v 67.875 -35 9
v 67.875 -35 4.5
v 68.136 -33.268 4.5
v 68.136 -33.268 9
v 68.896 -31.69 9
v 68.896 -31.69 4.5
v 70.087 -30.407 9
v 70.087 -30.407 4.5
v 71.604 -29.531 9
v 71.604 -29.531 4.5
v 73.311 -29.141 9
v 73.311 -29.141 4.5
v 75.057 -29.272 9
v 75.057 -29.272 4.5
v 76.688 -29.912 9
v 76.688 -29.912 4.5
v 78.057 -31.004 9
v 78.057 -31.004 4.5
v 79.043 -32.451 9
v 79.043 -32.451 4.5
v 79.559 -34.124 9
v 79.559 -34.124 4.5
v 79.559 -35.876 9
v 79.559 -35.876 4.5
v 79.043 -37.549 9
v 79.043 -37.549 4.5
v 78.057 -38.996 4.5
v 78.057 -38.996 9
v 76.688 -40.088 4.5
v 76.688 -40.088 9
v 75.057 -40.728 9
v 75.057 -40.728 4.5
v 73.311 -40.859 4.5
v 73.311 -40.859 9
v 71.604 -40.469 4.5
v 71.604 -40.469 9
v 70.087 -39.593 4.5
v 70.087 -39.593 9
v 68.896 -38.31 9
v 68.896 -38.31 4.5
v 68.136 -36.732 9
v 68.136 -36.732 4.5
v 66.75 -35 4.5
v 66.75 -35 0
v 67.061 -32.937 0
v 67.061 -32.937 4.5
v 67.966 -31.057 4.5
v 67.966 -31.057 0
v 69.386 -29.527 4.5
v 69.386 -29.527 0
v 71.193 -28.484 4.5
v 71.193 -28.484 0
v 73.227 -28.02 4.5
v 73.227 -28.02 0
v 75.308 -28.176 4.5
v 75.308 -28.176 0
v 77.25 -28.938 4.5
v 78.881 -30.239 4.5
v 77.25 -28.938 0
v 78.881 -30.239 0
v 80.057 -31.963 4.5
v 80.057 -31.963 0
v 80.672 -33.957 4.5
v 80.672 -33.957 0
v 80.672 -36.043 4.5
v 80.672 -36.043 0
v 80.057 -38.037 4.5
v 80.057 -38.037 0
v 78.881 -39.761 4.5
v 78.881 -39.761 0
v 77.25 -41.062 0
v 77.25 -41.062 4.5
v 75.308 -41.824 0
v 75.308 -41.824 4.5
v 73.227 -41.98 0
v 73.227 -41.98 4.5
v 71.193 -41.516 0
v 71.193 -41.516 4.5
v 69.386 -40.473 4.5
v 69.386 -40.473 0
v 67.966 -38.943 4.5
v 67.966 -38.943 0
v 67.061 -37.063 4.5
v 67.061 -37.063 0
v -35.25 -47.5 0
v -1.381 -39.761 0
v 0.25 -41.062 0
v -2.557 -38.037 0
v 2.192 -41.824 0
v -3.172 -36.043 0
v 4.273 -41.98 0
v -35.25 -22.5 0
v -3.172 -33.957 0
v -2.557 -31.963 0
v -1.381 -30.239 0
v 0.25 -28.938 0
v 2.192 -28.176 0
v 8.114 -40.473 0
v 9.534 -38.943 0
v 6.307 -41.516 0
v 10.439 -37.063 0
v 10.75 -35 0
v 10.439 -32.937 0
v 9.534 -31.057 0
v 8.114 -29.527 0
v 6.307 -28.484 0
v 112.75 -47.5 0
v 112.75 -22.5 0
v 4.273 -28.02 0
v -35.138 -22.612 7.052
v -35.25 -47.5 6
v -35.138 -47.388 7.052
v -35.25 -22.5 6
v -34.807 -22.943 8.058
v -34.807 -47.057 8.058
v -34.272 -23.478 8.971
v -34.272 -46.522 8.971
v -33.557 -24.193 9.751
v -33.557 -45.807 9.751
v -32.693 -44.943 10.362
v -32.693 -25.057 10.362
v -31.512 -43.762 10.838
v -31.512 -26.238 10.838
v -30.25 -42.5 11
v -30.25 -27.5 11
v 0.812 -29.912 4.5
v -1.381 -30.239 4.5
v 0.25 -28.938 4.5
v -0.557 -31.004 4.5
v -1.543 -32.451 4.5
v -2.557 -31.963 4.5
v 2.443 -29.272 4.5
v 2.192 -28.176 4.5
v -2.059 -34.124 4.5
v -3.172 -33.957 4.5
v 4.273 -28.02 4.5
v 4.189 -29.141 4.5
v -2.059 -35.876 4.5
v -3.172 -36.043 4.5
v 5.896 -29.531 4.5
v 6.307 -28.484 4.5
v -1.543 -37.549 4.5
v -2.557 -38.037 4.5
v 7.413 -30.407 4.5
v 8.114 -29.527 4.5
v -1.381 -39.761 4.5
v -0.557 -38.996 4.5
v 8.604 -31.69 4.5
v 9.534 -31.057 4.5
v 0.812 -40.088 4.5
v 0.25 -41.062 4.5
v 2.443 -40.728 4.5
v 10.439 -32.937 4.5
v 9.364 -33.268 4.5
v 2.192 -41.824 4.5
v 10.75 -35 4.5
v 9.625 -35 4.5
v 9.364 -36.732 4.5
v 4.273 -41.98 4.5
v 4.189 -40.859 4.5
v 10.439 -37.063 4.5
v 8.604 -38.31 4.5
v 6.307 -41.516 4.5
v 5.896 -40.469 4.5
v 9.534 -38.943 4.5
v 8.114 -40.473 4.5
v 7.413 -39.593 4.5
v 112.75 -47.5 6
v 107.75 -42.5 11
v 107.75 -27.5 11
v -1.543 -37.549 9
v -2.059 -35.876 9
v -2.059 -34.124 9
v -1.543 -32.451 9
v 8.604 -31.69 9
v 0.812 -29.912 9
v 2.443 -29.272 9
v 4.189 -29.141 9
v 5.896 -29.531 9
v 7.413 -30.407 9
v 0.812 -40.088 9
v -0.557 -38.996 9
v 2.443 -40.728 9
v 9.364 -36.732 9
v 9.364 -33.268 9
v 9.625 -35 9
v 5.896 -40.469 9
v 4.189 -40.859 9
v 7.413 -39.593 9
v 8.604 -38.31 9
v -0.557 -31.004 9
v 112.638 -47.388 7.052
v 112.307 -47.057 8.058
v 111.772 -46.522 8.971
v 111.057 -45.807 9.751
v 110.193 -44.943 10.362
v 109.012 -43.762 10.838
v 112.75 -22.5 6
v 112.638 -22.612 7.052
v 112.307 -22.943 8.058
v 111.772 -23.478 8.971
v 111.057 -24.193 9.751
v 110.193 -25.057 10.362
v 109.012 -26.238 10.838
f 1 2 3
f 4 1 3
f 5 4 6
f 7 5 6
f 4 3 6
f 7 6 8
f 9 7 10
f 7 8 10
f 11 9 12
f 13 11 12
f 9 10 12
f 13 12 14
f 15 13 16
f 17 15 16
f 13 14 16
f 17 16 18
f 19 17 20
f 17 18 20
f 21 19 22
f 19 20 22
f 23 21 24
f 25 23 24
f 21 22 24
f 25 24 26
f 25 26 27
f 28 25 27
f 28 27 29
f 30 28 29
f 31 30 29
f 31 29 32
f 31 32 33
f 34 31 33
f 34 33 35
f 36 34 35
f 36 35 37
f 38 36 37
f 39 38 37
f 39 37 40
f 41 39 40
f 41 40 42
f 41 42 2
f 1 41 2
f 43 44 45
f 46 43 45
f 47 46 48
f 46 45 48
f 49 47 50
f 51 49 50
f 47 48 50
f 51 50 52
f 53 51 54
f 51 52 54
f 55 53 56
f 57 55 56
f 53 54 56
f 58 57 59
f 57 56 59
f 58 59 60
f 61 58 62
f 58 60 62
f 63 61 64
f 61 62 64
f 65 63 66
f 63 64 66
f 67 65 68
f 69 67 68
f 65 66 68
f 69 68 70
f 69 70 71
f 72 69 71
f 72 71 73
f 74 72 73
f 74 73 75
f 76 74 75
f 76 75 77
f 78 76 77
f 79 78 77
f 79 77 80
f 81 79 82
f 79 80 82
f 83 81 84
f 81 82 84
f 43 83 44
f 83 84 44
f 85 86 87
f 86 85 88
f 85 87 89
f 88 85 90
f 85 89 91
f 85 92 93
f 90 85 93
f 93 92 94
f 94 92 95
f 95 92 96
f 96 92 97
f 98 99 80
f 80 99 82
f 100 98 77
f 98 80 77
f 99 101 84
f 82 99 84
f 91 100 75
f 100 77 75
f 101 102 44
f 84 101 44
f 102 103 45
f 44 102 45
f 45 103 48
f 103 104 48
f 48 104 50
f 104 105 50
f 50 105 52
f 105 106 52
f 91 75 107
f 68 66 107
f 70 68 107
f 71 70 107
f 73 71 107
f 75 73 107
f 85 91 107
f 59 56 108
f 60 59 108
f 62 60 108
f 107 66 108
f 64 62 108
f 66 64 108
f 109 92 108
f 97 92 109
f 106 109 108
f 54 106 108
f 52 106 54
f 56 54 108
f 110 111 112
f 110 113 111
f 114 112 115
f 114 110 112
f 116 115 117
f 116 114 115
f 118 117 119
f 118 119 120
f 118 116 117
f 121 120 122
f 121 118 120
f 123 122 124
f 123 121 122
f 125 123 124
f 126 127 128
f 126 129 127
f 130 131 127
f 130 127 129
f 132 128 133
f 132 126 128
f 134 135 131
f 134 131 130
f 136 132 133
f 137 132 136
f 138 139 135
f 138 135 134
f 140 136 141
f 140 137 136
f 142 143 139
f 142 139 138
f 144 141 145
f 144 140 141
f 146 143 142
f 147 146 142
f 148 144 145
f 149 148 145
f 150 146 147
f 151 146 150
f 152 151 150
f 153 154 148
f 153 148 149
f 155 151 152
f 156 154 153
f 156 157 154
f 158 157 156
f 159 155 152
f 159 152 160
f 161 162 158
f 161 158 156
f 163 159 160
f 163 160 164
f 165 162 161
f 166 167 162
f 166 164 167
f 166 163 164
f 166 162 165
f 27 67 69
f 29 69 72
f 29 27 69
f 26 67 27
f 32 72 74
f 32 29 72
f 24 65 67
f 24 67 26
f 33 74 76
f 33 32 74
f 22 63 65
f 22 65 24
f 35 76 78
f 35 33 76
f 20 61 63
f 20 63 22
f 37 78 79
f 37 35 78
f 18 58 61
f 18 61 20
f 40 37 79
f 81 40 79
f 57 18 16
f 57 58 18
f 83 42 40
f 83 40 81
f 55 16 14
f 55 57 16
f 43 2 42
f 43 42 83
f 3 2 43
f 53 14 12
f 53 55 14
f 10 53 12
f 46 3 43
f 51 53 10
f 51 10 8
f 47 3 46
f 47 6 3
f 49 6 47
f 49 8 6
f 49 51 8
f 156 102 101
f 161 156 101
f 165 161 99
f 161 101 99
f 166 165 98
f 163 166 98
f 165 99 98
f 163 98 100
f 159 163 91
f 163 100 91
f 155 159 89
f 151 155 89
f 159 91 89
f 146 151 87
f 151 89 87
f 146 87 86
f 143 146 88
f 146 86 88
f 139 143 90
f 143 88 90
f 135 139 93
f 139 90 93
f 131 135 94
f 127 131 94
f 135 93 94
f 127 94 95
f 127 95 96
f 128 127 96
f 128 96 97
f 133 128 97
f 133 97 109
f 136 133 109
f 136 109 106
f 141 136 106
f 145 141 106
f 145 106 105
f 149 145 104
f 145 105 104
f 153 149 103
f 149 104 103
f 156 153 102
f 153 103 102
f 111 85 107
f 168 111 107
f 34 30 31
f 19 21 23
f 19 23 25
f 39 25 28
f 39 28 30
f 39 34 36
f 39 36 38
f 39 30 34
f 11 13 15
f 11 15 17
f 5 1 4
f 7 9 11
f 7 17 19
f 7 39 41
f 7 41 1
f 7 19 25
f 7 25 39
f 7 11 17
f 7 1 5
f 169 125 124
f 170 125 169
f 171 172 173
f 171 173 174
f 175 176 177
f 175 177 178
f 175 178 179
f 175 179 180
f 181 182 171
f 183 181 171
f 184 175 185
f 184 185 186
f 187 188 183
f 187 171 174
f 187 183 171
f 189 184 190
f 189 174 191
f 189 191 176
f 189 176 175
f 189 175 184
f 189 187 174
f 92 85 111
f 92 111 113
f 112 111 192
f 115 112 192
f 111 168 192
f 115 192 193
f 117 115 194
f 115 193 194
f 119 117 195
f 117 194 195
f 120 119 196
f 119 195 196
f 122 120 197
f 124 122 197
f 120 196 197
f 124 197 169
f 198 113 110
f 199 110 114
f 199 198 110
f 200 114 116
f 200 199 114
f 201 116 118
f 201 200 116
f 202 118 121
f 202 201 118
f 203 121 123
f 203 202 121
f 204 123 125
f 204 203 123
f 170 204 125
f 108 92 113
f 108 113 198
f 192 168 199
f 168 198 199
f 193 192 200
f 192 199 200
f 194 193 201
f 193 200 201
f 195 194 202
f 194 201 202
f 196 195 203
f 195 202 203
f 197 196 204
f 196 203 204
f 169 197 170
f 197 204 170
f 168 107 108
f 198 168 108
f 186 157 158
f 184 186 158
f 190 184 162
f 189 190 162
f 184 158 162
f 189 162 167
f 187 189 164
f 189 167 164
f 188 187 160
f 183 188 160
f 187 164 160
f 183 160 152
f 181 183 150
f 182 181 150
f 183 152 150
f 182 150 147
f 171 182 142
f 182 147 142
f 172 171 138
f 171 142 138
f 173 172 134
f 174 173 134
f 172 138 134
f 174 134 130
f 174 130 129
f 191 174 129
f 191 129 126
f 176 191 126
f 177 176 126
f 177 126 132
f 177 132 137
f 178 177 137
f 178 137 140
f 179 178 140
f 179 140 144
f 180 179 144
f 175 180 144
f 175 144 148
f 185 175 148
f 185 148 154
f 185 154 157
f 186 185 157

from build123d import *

# Parameters (mm, degrees)
CROQUIS1_W              = 148
CROQUIS1_H              = 25
SALIENTE_EXTRUIR1_DEPTH = 11
REDONDEO1_R             = 5
CROQUIS2_R              = 5.875
CORTAR_EXTRUIR1_DEPTH   = 9
CROQUIS3_R              = 7
CORTAR_EXTRUIR2_DEPTH   = 4.5


with BuildPart() as part:
    # Croquis1 → Saliente-Extruir1 (new body)
    with BuildSketch(Plane.XY):
        with Locations((38.75, -35)):
            Rectangle(CROQUIS1_W, CROQUIS1_H)
    extrude(amount=SALIENTE_EXTRUIR1_DEPTH)

    # Redondeo1
    redondeo1_edges = [part.edges().sort_by_distance(p)[0] for p in [
        (112.75, -35, 11),
        (38.75, -22.5, 11),
        (-35.25, -35, 11),
        (38.75, -47.5, 11),
    ]]
    fillet(redondeo1_edges, radius=REDONDEO1_R)

    # Croquis2 → Cortar-Extruir1 (cut)
    with BuildSketch(Plane(origin=(0, 0, 0), x_dir=(-1, 0, 0), z_dir=(0, 0, -1))):
        with Locations((-73.75, -35)):
            Circle(CROQUIS2_R)
        with Locations(Location((-3.75, -35, 0), (0, 0, 180))):  # turned: the seam where the file's is
            Circle(CROQUIS2_R)
    extrude(amount=-CORTAR_EXTRUIR1_DEPTH, mode=Mode.SUBTRACT)

    # Croquis3 → Cortar-Extruir2 (cut)
    with BuildSketch(Plane(origin=(0, 0, 0), x_dir=(-1, 0, 0), z_dir=(0, 0, -1))):
        with Locations((-73.75, -35)):
            Circle(CROQUIS3_R)
        with Locations(Location((-3.75, -35, 0), (0, 0, 180))):  # turned: the seam where the file's is
            Circle(CROQUIS3_R)
    extrude(amount=-CORTAR_EXTRUIR2_DEPTH, mode=Mode.SUBTRACT)


solid = part.part
